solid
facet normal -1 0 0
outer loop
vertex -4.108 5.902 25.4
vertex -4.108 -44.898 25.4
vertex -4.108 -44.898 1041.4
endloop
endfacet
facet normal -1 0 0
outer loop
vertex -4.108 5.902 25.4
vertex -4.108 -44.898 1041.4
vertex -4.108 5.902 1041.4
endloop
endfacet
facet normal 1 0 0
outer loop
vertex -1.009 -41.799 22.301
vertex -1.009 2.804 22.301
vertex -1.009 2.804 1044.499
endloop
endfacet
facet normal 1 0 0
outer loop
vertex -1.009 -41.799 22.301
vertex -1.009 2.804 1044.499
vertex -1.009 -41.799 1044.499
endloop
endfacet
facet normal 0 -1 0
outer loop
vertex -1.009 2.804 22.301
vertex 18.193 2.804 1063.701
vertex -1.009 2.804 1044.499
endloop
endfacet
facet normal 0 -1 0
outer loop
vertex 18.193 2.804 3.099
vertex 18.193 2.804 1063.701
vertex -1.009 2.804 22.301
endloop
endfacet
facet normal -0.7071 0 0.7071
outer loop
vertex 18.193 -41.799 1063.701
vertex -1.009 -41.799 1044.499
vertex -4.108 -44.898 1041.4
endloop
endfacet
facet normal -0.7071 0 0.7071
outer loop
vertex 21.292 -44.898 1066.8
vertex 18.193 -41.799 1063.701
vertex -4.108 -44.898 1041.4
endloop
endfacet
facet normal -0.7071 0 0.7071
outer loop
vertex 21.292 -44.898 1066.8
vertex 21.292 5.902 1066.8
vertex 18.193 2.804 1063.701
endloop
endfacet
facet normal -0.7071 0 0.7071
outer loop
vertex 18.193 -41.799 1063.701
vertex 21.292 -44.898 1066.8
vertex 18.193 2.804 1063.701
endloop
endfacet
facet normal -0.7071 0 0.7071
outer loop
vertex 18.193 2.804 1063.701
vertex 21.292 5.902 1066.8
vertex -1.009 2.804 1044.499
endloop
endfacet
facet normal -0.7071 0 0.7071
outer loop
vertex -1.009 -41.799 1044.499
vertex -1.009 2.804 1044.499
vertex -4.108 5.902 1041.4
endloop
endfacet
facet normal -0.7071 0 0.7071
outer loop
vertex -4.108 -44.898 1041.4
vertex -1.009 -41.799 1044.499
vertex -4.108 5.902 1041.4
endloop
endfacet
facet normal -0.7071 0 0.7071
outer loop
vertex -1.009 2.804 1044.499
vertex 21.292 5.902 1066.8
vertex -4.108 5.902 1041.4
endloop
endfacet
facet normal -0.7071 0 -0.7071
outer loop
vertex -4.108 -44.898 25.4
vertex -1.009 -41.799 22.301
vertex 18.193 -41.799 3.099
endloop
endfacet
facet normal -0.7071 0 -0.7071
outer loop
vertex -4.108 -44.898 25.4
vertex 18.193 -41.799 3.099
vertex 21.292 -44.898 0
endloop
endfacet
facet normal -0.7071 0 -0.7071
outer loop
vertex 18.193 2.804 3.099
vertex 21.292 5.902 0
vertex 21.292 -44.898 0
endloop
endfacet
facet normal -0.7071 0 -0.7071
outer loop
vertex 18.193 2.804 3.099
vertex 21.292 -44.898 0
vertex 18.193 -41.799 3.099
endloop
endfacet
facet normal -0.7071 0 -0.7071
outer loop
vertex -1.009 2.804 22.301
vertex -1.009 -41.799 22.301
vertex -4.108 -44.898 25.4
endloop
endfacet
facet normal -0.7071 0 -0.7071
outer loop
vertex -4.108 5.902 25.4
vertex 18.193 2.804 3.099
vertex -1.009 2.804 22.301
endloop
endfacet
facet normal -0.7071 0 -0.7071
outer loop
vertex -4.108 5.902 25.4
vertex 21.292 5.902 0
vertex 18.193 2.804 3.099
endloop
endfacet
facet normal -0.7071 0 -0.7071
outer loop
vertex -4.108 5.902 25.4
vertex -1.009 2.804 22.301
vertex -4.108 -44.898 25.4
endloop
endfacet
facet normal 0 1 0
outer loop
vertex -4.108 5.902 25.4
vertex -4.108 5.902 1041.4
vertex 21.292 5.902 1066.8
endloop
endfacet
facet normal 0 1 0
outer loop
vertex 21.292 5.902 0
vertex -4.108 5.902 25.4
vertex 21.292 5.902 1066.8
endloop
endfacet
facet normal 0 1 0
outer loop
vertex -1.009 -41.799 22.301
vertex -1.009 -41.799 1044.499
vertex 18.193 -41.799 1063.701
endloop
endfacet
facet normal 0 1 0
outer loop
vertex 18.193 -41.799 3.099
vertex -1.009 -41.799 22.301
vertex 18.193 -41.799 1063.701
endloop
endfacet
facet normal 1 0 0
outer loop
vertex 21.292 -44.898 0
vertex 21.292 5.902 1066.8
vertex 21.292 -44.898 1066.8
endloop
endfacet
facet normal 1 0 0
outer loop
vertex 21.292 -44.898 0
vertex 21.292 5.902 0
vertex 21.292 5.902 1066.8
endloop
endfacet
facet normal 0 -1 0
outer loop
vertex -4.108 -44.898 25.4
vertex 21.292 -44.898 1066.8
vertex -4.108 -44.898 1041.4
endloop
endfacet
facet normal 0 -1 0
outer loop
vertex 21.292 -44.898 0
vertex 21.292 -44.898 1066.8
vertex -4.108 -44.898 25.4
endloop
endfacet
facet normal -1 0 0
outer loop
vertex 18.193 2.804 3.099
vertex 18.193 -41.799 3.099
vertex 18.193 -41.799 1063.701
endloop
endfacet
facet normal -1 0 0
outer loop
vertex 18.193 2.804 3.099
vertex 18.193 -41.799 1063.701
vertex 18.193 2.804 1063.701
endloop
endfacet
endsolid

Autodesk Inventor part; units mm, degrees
ref_plane "YZ Plane" through (0, 0, 0) normal (1, 0, 0) x (0, 1, 0)
ref_plane "XZ Plane" through (0, 0, 0) normal (0, 1, 0) x (-1, 0, 0)
ref_plane "XY Plane" through (0, 0, 0) normal (0, 0, 1) x (1, 0, 0)
sketch "Sketch2" plane through (0, 0, 0) normal (0, 0, 1) x (1, 0, 0)
  line L0 (-4.1078, 5.9023) -> (21.2922, 5.9023)
  line L1 (21.2922, 5.9023) -> (21.2922, -44.8977)
  line L2 (21.2922, -44.8977) -> (-4.1078, -44.8977)
  line L3 (-4.1078, -44.8977) -> (-4.1078, 5.9023)
  line L4 (18.1934, 2.8035) -> (-1.009, 2.8035)
  line L5 (-1.009, 2.8035) -> (-1.009, -41.7989)
  line L6 (-1.009, -41.7989) -> (18.1934, -41.7989)
  line L7 (18.1934, -41.7989) -> (18.1934, 2.8035)
  point P0 (0, 0)
  dimension "d0" = 25.4
  dimension "d1" = 50.8
  dimension "d2" = 3.0988
extrude "Extrusion1" add sketch "Sketch2" along normal blind 1066.8
sketch "Sketch5" plane through (0, 0, 1066.8) normal (0, 0, 1) x (1, 0, 0)
  point P0 (0, 0)
sketch "Sketch6" plane through (-4.1078, 5.9023, 0) normal (0, 1, 0) x (1, 0, 0)
  line L0 (25.4, 0) -> (-1.2066, -26.6066)
  line L1 (0, 0) -> (0, -1066.8) projected
  line L2 (0, -25.4) -> (0, 0)
  line L3 (0, 0) -> (25.4, 0)
  line L4 (0, -1066.8) -> (25.4, -1066.8) projected
  line L5 (25.4, -1066.8) -> (-7.0638, -1034.3362)
  line L6 (25.4, -1066.8) -> (71.3108, -1066.8) construction
  line L7 (0, -1041.4) -> (0, -1066.8)
  line L8 (0, -1066.8) -> (25.4, -1066.8)
  point P0 (4.1078, 0)
  dimension "d11" = 135
extrude "Extrusion2" cut sketch "Sketch6" against normal blind 1066.8 contours L0 L1 L3
extrude "Extrusion3" cut sketch "Sketch6" against normal blind 1066.8 contours L5 L4 L1
properties part number "42in 2x1 boxbeam"
